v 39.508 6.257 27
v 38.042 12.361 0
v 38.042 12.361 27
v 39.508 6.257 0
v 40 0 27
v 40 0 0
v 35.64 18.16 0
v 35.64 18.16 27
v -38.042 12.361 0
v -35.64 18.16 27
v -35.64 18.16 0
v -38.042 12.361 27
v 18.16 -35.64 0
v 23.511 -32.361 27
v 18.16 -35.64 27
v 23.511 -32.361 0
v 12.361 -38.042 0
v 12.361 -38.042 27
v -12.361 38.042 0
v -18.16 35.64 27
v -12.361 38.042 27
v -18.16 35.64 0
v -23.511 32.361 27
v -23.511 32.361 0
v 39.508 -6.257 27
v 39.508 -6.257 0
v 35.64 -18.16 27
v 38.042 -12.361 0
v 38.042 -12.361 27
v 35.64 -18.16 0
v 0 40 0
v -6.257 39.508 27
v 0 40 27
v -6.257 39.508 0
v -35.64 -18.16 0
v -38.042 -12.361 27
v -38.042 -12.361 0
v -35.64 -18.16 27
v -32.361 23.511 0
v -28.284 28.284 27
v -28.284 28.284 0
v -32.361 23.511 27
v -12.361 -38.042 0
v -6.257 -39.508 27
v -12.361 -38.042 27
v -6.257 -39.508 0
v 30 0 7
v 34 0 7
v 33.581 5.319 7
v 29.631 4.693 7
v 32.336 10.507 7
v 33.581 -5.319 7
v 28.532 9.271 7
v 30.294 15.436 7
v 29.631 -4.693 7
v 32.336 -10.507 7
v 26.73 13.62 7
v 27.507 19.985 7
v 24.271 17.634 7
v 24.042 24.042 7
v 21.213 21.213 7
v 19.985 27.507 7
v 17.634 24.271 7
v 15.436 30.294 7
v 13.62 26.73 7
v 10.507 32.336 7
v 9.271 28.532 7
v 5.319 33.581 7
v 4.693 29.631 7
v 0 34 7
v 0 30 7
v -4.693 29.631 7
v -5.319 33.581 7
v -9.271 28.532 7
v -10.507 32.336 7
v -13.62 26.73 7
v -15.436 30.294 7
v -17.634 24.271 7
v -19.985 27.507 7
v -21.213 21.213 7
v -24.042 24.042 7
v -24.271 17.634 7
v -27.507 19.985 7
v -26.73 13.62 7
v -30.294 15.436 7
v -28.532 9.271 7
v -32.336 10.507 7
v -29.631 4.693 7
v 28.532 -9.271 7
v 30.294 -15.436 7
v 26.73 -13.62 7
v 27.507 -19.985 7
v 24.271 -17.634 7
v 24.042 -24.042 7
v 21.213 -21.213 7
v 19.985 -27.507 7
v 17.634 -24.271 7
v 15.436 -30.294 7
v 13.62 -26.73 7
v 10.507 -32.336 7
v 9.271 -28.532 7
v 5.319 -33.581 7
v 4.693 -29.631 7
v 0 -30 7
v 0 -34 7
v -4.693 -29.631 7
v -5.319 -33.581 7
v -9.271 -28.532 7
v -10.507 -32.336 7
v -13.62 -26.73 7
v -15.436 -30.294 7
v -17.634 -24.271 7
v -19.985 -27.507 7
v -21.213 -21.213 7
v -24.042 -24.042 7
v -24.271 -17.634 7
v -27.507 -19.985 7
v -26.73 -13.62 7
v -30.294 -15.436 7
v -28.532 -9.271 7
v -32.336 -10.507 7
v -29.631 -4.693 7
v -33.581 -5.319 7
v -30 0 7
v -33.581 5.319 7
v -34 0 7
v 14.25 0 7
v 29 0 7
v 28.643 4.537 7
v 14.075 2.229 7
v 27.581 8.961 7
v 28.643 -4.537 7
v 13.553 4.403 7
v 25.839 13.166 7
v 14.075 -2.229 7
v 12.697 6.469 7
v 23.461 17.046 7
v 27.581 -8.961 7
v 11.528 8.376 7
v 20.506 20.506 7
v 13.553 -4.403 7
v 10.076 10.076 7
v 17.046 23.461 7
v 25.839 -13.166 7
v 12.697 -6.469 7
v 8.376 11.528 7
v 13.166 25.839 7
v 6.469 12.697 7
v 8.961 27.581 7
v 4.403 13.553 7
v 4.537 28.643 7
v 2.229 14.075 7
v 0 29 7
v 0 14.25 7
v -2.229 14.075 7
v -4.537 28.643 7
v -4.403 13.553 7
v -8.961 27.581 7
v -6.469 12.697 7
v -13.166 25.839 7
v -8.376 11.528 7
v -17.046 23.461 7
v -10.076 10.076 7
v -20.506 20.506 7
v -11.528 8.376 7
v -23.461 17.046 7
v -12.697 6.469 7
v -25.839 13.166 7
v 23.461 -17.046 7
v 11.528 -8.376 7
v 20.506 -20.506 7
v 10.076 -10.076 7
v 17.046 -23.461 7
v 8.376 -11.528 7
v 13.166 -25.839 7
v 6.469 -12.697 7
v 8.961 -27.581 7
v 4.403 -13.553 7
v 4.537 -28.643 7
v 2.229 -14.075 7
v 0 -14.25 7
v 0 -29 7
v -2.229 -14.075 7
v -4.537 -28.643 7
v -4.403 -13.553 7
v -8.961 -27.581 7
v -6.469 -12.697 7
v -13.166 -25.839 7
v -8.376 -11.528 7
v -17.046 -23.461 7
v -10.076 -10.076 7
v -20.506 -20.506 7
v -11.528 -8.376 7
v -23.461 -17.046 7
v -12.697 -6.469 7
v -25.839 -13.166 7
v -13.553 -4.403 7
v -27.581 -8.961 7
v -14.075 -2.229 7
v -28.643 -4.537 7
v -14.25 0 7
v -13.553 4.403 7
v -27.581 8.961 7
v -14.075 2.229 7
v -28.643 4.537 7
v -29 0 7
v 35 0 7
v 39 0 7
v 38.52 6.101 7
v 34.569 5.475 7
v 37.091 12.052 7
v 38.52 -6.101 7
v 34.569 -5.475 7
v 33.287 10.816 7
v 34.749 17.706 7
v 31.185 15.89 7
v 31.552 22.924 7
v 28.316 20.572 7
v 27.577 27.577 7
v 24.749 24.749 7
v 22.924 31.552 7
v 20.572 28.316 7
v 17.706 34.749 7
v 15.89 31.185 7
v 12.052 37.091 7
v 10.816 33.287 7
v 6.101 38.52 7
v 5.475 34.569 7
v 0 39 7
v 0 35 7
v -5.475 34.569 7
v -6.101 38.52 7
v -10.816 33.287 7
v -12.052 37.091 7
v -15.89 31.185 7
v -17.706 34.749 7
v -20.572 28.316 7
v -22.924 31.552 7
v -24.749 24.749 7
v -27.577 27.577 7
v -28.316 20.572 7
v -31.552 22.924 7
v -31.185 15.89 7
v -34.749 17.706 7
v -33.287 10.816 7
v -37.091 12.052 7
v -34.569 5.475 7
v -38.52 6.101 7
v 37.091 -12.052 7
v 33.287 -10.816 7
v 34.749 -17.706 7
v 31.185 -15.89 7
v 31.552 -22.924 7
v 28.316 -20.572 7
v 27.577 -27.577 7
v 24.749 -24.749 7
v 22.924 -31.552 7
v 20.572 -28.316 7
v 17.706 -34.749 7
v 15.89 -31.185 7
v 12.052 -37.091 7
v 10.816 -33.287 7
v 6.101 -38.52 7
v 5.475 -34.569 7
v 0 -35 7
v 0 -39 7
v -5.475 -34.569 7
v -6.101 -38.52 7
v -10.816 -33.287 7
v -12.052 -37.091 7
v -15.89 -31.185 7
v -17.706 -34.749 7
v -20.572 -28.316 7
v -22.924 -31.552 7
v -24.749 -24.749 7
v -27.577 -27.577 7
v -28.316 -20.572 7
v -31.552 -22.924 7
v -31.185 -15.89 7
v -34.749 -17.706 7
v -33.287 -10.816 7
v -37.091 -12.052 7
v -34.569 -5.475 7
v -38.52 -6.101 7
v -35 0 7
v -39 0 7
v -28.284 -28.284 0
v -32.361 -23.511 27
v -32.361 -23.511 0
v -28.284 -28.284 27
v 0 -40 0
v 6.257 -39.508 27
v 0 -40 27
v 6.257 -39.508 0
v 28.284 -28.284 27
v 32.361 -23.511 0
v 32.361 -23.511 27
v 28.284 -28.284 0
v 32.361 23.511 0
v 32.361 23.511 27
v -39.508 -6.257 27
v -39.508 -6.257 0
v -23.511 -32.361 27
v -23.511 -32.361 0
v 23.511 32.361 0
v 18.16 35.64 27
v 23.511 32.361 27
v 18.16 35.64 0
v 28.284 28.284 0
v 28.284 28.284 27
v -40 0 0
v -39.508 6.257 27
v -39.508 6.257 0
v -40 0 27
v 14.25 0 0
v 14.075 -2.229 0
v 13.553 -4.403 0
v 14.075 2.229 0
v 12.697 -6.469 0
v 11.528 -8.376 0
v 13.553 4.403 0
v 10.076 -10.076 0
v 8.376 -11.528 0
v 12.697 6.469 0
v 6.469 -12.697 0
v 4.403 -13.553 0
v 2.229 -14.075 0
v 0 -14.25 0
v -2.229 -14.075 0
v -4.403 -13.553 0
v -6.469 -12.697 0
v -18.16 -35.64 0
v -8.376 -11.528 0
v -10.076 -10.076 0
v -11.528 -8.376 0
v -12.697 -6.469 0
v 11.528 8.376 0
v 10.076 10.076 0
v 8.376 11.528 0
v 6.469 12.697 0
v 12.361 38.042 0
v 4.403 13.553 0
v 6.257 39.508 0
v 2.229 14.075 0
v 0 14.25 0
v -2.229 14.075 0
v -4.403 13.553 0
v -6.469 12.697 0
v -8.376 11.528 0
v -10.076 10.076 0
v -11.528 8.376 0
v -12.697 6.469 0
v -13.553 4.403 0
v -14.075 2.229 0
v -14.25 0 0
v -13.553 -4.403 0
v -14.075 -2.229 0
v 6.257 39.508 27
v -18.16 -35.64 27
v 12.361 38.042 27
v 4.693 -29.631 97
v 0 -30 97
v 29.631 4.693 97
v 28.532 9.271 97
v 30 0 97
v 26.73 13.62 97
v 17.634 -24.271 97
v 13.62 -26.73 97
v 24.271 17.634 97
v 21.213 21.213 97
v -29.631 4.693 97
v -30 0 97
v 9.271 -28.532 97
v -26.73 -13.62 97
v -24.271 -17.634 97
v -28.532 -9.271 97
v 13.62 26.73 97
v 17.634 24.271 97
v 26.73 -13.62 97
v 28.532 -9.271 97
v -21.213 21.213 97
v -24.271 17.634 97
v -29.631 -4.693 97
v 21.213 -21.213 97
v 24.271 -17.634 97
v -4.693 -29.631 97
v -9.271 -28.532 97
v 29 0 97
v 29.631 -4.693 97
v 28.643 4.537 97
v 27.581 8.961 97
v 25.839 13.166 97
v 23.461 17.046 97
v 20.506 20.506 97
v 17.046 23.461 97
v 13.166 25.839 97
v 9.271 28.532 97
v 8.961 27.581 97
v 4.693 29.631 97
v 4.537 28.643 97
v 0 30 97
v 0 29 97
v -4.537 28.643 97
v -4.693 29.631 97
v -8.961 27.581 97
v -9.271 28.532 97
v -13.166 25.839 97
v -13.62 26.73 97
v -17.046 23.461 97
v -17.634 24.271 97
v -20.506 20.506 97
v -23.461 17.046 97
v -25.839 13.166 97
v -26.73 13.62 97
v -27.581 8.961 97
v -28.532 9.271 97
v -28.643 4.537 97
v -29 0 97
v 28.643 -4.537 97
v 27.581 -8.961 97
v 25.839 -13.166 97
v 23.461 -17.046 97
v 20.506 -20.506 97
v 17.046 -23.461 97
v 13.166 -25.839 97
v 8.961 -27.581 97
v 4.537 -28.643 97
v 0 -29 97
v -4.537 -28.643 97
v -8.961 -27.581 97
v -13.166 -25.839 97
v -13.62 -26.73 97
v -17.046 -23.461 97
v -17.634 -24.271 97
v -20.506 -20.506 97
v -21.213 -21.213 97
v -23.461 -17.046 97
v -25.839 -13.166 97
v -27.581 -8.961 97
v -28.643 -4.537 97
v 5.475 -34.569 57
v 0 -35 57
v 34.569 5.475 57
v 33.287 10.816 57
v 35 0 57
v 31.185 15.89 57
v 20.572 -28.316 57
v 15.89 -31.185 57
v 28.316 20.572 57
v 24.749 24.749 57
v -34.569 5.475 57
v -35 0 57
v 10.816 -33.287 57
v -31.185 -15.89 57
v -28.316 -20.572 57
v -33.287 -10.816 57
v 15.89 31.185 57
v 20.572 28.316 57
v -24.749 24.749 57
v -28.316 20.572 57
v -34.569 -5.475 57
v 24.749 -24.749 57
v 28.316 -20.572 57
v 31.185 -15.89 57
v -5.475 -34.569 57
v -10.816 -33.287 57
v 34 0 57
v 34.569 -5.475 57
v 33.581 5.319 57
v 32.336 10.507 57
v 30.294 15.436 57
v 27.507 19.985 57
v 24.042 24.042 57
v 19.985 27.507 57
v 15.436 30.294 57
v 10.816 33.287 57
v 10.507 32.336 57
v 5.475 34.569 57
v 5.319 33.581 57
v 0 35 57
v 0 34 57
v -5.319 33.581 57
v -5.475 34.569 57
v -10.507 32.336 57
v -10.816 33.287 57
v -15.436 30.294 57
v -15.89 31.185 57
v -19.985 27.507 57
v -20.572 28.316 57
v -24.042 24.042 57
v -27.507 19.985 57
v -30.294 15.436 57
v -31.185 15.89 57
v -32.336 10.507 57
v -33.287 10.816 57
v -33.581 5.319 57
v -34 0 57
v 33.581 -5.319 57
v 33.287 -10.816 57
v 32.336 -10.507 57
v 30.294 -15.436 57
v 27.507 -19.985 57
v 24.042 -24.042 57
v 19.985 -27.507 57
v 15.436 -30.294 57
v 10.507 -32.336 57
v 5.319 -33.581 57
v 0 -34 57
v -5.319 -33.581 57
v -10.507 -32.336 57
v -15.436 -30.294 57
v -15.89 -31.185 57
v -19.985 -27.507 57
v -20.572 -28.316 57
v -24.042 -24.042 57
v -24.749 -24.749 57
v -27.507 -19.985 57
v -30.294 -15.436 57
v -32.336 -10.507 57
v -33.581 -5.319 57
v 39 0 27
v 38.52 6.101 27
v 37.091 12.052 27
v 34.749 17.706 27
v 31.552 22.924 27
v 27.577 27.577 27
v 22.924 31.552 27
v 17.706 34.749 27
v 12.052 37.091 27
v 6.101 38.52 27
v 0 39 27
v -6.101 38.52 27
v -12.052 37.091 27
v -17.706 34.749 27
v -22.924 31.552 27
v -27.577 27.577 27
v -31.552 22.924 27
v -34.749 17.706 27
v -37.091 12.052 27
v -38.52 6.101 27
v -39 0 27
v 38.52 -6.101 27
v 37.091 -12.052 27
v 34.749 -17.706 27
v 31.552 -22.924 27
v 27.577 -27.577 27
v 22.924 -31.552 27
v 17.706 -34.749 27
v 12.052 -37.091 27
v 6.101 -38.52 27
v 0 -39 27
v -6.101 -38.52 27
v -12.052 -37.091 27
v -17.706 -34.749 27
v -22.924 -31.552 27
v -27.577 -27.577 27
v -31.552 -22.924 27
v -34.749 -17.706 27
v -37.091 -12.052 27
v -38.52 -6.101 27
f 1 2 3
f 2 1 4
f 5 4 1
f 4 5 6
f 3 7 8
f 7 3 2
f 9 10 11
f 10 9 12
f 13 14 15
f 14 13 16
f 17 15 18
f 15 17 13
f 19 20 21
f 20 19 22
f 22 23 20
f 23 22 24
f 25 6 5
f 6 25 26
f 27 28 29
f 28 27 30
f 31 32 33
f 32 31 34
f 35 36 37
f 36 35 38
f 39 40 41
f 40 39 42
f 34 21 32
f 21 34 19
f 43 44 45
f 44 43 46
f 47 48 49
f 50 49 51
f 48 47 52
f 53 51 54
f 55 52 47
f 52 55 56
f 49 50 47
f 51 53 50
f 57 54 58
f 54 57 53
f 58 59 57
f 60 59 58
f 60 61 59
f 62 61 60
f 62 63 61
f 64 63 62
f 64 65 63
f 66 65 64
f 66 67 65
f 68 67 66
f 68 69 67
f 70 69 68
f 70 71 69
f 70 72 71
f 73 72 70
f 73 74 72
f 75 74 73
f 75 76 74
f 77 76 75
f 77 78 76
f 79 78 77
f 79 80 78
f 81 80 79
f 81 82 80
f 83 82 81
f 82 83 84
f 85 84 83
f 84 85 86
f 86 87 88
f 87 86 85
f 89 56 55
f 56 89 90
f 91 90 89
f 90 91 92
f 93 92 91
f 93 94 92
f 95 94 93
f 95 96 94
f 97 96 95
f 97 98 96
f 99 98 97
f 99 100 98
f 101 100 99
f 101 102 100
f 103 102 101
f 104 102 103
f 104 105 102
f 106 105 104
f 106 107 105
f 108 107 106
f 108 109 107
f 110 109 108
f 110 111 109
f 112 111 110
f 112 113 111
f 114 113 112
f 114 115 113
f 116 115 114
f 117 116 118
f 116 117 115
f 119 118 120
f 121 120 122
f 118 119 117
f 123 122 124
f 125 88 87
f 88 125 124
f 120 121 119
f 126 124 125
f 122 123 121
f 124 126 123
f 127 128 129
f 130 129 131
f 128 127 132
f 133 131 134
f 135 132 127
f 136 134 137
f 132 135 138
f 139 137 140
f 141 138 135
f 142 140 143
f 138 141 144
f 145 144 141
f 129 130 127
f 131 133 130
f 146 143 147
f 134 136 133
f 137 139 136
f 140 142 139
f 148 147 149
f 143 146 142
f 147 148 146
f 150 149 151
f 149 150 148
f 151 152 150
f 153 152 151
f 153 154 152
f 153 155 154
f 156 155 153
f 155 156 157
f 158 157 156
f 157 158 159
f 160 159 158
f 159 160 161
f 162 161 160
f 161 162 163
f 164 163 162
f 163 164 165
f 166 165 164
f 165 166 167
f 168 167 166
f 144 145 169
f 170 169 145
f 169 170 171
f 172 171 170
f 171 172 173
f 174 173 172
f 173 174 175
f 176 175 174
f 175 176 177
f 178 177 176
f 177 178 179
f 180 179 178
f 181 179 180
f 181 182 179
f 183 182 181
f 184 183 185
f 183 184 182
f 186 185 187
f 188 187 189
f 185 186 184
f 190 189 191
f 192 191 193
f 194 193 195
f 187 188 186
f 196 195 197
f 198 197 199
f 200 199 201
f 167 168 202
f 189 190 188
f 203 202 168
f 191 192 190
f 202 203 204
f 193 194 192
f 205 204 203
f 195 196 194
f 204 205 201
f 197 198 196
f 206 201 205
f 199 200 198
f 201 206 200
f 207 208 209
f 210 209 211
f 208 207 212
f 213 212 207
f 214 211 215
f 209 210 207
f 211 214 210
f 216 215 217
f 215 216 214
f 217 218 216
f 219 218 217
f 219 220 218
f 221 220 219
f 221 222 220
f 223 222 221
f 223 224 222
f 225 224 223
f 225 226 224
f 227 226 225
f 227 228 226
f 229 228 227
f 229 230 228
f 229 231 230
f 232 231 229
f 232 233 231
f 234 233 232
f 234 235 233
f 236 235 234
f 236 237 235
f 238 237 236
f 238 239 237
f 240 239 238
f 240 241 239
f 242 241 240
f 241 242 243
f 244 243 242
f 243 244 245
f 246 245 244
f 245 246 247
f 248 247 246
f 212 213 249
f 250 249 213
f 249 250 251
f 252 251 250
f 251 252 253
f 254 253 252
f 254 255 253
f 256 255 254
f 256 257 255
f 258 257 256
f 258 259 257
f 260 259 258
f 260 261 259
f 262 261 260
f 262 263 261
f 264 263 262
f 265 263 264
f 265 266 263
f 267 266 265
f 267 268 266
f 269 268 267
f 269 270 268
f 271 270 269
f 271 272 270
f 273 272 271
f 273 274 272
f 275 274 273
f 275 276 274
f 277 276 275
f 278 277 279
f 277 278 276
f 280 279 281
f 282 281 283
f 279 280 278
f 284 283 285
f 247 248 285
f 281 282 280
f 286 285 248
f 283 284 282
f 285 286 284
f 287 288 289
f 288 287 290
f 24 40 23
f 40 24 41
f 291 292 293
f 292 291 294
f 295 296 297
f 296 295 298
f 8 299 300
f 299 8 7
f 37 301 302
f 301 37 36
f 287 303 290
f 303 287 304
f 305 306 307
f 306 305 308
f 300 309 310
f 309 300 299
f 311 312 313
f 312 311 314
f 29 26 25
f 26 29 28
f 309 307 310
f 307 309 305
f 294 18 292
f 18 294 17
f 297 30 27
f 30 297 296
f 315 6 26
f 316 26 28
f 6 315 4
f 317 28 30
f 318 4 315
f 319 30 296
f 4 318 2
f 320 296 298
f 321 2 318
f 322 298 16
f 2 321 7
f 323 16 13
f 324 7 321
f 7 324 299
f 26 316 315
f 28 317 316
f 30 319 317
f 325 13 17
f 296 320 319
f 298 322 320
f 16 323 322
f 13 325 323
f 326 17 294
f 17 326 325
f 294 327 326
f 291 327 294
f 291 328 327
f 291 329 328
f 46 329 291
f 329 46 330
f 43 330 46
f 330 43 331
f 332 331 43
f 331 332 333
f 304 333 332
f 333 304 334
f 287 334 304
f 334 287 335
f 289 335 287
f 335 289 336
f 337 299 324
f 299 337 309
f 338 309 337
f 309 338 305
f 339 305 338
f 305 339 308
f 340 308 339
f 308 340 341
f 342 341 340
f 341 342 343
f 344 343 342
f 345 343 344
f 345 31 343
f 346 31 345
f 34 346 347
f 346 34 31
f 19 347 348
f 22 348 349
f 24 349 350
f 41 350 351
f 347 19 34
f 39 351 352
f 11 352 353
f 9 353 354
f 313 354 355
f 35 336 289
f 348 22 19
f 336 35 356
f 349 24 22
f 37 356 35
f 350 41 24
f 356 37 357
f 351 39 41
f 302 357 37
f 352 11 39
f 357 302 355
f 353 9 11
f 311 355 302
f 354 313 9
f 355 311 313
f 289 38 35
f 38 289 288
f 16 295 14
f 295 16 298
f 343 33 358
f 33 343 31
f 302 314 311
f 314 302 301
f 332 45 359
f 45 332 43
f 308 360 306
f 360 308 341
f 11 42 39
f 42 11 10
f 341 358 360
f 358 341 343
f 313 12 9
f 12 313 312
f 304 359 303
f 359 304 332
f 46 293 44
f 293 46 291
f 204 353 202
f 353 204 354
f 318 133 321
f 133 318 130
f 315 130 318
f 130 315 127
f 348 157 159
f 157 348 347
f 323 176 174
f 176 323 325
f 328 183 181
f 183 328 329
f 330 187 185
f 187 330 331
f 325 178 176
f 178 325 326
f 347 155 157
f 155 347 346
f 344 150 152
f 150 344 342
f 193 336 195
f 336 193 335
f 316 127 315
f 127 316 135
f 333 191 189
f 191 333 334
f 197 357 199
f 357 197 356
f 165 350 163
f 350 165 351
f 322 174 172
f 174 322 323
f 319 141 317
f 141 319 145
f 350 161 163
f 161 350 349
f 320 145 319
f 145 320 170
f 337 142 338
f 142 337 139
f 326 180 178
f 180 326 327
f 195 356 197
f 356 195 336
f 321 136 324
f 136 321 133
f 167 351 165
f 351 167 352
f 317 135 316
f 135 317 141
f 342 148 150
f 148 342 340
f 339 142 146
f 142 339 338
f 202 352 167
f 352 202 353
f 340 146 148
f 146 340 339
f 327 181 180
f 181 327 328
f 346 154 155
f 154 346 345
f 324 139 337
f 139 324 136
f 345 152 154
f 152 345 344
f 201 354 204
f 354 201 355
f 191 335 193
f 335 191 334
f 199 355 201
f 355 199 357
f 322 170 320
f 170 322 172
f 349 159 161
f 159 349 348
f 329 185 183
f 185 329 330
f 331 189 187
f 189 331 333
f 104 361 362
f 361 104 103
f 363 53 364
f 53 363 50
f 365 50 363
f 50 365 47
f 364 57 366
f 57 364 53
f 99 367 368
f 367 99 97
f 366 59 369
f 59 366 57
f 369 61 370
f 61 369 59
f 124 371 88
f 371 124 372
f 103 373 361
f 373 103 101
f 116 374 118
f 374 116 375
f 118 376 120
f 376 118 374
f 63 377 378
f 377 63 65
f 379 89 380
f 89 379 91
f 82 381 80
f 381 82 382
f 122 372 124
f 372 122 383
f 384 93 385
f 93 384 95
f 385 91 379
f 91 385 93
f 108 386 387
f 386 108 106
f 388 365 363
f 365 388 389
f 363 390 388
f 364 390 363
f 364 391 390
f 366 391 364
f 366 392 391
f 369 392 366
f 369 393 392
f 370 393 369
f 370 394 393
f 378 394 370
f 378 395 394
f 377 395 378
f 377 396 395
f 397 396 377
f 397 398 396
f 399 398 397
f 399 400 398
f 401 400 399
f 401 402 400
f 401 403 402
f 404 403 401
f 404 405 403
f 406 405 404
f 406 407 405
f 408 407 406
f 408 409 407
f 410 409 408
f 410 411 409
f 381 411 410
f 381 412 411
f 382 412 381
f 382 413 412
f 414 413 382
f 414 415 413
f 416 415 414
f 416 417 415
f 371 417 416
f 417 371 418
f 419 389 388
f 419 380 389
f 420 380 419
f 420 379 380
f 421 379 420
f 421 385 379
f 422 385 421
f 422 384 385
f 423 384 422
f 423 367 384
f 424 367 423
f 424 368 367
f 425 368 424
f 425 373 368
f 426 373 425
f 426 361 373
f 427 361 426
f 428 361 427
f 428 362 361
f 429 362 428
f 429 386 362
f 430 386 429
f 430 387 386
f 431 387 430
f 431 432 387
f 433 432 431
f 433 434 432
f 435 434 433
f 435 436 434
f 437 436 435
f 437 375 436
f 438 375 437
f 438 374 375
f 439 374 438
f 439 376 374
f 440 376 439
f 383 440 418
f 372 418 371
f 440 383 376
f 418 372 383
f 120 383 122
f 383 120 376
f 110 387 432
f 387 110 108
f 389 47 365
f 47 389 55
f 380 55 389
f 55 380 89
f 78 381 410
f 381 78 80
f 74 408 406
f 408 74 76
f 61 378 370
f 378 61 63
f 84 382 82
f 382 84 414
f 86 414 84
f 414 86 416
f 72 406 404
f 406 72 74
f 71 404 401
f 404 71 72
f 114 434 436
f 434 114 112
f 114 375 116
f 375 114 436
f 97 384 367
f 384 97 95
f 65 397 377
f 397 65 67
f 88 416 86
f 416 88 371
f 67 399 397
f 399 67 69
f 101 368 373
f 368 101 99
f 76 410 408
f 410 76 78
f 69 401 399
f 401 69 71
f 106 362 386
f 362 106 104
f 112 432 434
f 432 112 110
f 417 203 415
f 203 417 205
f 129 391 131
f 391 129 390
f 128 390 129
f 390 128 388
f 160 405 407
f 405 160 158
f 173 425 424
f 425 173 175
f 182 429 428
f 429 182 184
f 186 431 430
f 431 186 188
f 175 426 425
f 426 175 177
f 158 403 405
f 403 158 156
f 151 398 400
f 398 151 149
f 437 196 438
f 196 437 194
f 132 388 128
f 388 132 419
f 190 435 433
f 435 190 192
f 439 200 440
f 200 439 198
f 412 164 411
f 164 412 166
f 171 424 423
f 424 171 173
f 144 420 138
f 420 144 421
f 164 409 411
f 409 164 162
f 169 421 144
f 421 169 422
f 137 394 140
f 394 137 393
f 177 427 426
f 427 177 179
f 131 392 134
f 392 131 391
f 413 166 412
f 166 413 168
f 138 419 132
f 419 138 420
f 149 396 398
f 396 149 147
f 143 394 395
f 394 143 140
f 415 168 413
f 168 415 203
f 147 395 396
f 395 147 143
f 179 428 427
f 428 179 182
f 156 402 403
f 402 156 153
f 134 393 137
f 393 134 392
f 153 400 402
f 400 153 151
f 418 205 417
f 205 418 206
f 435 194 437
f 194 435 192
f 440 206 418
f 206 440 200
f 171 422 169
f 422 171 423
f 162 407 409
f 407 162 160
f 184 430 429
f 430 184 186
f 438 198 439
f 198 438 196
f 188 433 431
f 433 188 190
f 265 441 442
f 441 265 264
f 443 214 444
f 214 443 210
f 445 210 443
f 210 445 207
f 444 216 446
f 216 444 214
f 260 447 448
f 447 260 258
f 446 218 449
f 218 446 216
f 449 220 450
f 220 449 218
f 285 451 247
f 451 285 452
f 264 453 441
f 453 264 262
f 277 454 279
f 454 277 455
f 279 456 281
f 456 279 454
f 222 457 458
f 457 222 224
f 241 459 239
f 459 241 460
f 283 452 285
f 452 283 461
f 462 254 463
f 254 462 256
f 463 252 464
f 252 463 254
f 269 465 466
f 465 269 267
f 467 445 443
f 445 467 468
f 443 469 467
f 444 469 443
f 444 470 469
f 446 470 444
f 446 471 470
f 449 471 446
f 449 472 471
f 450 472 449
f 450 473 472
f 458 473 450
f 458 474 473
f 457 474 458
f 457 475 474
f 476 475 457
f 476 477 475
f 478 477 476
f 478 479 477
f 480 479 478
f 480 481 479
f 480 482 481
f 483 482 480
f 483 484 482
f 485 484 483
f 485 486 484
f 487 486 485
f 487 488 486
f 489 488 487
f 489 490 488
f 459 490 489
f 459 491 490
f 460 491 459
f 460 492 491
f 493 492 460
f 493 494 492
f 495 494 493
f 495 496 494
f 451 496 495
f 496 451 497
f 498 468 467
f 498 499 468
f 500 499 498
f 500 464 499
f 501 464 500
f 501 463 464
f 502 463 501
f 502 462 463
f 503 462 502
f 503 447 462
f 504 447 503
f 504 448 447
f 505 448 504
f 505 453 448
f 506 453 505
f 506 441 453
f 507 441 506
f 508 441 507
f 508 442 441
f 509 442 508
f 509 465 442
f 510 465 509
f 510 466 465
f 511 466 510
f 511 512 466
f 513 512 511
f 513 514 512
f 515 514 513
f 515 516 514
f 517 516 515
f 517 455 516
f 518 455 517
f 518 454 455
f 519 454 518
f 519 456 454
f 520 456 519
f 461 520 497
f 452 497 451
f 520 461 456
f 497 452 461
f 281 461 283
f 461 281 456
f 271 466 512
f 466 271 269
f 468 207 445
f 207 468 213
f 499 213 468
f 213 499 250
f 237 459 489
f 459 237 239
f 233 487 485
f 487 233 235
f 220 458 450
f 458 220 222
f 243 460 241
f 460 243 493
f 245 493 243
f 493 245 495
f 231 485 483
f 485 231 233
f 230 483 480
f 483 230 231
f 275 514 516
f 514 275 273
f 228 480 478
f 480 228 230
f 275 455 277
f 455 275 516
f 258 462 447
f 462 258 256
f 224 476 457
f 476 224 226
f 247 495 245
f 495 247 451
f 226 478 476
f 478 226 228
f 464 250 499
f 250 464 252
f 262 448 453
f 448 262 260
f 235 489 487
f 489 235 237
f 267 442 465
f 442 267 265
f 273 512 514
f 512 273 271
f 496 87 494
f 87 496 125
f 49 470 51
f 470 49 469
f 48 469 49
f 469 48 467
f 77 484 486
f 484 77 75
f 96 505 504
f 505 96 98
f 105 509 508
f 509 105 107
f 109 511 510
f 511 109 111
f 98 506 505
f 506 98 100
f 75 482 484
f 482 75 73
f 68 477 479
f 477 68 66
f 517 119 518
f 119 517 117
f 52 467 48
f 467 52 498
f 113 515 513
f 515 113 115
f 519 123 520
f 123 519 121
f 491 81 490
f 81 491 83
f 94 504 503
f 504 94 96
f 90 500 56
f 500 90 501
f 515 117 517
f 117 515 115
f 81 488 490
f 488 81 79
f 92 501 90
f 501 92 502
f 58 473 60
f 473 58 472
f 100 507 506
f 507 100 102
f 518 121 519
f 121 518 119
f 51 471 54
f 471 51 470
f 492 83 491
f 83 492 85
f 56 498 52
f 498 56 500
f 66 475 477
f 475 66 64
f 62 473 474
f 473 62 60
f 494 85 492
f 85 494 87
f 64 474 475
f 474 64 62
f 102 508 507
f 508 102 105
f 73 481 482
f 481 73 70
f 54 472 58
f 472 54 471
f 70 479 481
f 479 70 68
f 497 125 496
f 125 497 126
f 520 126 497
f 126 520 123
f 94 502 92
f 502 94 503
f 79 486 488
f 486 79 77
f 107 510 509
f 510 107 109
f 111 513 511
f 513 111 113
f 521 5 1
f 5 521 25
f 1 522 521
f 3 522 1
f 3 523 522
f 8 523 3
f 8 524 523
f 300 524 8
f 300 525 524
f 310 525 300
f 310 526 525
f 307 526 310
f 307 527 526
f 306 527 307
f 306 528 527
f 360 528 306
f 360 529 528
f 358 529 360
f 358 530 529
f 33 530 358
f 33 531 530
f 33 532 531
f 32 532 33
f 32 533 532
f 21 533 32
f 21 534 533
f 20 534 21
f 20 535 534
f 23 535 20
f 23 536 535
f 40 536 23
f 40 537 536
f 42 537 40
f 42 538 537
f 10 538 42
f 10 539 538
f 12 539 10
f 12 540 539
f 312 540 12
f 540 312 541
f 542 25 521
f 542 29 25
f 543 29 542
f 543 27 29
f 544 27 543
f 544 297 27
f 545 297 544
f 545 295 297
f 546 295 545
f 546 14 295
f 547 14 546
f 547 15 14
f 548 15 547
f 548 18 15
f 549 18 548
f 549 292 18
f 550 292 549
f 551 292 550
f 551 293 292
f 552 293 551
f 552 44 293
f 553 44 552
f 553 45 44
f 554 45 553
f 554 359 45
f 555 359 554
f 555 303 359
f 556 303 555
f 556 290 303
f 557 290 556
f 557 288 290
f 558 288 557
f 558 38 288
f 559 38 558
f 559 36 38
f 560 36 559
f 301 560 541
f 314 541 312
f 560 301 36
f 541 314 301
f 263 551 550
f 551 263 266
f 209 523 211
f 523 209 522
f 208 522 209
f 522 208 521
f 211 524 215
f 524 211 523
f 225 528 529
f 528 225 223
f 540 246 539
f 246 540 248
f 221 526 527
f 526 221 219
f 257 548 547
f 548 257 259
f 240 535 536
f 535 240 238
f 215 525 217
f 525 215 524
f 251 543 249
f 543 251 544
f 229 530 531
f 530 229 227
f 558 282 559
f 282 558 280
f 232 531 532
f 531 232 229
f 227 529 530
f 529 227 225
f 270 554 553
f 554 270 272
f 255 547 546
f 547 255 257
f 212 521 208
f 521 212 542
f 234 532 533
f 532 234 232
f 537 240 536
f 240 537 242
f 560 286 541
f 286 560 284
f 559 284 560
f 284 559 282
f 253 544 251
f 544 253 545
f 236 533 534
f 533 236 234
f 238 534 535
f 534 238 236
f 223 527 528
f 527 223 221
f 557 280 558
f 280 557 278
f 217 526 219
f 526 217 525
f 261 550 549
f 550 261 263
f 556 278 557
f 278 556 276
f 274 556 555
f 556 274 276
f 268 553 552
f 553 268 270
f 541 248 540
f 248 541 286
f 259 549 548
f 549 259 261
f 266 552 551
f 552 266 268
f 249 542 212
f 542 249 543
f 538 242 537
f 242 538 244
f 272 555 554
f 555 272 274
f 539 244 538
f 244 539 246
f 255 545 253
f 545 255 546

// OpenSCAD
/// Ikea light mod v3 - 3 Rings- March 25,2016


/////////  base plate variables
basePlate_d=80;
basePlate_h=7;
basePlateSub_d=28.5;    // hole for ikea type G lamp stand
basePlateSub_h=12;
//  inside tube
insideTube_d=60;
insideTube_h=90;
insideTubeSub_d=insideTube_d-2;
insideTubeSub_h=insideTube_h+2;
//  middle tube
middleTube_d=70;
middleTube_h=50;
middleTubeSub_d=middleTube_d-2;
middleTubeSub_h=middleTube_h+2;
//  outside tube
outsideTube_d=80;
outsideTube_h=20;
outsideTubeSub_d=outsideTube_d-2;
outsideTubeSub_h=outsideTube_h+2;
/////////  final assembly

basePlateAssy();
translate([0,0,basePlate_h])
    insideTube();
translate([0,0,basePlate_h])
    middleTube();
translate([0,0,basePlate_h])
    outsideTube();
    
module basePlateAssy() {
    difference() {
        translate([0,0,])
            basePlate();
        translate([0,0,-1])
            basePlateSub();
    }
}

module insideTube() {
    difference() {
            color("green")
                cylinder(d=insideTube_d, h=insideTube_h, center=false, $fn=40);
        translate([0,0,-1])
                color("red")
                    cylinder(d=insideTubeSub_d, h=insideTubeSub_h, center=false, $fn=40);
    }
}
module middleTube() {
    difference() {
            color("yellowgreen")
                cylinder(d=middleTube_d, h=middleTube_h, center=false, $fn=40);
        translate([0,0,-1])
                color("orange")
                    cylinder(d=middleTubeSub_d, h=middleTubeSub_h, center=false, $fn=40);
    }
}
module outsideTube() {
    difference() {
            color("khaki")
                cylinder(d=outsideTube_d, h=outsideTube_h, center=false, $fn=40);
        translate([0,0,-1])
                color("red")
                    cylinder(d=outsideTubeSub_d, h=outsideTubeSub_h, center=false, $fn=40);
    }
}
////////// basic shapes
module basePlate() {
    color("blue")
    cylinder(d=basePlate_d, h=basePlate_h, center=false, $fn=40);

}

////////// Subtractions

module basePlateSub() {
    color("red")
        cylinder(d=basePlateSub_d, h=basePlateSub_h, center=false, $fn=40); 
}
module baseTubeSub() {
    color("orange")
       cylinder(d=baseTubeSub_d, h=baseTubeSub_h, center=false, $fn=40);
}
